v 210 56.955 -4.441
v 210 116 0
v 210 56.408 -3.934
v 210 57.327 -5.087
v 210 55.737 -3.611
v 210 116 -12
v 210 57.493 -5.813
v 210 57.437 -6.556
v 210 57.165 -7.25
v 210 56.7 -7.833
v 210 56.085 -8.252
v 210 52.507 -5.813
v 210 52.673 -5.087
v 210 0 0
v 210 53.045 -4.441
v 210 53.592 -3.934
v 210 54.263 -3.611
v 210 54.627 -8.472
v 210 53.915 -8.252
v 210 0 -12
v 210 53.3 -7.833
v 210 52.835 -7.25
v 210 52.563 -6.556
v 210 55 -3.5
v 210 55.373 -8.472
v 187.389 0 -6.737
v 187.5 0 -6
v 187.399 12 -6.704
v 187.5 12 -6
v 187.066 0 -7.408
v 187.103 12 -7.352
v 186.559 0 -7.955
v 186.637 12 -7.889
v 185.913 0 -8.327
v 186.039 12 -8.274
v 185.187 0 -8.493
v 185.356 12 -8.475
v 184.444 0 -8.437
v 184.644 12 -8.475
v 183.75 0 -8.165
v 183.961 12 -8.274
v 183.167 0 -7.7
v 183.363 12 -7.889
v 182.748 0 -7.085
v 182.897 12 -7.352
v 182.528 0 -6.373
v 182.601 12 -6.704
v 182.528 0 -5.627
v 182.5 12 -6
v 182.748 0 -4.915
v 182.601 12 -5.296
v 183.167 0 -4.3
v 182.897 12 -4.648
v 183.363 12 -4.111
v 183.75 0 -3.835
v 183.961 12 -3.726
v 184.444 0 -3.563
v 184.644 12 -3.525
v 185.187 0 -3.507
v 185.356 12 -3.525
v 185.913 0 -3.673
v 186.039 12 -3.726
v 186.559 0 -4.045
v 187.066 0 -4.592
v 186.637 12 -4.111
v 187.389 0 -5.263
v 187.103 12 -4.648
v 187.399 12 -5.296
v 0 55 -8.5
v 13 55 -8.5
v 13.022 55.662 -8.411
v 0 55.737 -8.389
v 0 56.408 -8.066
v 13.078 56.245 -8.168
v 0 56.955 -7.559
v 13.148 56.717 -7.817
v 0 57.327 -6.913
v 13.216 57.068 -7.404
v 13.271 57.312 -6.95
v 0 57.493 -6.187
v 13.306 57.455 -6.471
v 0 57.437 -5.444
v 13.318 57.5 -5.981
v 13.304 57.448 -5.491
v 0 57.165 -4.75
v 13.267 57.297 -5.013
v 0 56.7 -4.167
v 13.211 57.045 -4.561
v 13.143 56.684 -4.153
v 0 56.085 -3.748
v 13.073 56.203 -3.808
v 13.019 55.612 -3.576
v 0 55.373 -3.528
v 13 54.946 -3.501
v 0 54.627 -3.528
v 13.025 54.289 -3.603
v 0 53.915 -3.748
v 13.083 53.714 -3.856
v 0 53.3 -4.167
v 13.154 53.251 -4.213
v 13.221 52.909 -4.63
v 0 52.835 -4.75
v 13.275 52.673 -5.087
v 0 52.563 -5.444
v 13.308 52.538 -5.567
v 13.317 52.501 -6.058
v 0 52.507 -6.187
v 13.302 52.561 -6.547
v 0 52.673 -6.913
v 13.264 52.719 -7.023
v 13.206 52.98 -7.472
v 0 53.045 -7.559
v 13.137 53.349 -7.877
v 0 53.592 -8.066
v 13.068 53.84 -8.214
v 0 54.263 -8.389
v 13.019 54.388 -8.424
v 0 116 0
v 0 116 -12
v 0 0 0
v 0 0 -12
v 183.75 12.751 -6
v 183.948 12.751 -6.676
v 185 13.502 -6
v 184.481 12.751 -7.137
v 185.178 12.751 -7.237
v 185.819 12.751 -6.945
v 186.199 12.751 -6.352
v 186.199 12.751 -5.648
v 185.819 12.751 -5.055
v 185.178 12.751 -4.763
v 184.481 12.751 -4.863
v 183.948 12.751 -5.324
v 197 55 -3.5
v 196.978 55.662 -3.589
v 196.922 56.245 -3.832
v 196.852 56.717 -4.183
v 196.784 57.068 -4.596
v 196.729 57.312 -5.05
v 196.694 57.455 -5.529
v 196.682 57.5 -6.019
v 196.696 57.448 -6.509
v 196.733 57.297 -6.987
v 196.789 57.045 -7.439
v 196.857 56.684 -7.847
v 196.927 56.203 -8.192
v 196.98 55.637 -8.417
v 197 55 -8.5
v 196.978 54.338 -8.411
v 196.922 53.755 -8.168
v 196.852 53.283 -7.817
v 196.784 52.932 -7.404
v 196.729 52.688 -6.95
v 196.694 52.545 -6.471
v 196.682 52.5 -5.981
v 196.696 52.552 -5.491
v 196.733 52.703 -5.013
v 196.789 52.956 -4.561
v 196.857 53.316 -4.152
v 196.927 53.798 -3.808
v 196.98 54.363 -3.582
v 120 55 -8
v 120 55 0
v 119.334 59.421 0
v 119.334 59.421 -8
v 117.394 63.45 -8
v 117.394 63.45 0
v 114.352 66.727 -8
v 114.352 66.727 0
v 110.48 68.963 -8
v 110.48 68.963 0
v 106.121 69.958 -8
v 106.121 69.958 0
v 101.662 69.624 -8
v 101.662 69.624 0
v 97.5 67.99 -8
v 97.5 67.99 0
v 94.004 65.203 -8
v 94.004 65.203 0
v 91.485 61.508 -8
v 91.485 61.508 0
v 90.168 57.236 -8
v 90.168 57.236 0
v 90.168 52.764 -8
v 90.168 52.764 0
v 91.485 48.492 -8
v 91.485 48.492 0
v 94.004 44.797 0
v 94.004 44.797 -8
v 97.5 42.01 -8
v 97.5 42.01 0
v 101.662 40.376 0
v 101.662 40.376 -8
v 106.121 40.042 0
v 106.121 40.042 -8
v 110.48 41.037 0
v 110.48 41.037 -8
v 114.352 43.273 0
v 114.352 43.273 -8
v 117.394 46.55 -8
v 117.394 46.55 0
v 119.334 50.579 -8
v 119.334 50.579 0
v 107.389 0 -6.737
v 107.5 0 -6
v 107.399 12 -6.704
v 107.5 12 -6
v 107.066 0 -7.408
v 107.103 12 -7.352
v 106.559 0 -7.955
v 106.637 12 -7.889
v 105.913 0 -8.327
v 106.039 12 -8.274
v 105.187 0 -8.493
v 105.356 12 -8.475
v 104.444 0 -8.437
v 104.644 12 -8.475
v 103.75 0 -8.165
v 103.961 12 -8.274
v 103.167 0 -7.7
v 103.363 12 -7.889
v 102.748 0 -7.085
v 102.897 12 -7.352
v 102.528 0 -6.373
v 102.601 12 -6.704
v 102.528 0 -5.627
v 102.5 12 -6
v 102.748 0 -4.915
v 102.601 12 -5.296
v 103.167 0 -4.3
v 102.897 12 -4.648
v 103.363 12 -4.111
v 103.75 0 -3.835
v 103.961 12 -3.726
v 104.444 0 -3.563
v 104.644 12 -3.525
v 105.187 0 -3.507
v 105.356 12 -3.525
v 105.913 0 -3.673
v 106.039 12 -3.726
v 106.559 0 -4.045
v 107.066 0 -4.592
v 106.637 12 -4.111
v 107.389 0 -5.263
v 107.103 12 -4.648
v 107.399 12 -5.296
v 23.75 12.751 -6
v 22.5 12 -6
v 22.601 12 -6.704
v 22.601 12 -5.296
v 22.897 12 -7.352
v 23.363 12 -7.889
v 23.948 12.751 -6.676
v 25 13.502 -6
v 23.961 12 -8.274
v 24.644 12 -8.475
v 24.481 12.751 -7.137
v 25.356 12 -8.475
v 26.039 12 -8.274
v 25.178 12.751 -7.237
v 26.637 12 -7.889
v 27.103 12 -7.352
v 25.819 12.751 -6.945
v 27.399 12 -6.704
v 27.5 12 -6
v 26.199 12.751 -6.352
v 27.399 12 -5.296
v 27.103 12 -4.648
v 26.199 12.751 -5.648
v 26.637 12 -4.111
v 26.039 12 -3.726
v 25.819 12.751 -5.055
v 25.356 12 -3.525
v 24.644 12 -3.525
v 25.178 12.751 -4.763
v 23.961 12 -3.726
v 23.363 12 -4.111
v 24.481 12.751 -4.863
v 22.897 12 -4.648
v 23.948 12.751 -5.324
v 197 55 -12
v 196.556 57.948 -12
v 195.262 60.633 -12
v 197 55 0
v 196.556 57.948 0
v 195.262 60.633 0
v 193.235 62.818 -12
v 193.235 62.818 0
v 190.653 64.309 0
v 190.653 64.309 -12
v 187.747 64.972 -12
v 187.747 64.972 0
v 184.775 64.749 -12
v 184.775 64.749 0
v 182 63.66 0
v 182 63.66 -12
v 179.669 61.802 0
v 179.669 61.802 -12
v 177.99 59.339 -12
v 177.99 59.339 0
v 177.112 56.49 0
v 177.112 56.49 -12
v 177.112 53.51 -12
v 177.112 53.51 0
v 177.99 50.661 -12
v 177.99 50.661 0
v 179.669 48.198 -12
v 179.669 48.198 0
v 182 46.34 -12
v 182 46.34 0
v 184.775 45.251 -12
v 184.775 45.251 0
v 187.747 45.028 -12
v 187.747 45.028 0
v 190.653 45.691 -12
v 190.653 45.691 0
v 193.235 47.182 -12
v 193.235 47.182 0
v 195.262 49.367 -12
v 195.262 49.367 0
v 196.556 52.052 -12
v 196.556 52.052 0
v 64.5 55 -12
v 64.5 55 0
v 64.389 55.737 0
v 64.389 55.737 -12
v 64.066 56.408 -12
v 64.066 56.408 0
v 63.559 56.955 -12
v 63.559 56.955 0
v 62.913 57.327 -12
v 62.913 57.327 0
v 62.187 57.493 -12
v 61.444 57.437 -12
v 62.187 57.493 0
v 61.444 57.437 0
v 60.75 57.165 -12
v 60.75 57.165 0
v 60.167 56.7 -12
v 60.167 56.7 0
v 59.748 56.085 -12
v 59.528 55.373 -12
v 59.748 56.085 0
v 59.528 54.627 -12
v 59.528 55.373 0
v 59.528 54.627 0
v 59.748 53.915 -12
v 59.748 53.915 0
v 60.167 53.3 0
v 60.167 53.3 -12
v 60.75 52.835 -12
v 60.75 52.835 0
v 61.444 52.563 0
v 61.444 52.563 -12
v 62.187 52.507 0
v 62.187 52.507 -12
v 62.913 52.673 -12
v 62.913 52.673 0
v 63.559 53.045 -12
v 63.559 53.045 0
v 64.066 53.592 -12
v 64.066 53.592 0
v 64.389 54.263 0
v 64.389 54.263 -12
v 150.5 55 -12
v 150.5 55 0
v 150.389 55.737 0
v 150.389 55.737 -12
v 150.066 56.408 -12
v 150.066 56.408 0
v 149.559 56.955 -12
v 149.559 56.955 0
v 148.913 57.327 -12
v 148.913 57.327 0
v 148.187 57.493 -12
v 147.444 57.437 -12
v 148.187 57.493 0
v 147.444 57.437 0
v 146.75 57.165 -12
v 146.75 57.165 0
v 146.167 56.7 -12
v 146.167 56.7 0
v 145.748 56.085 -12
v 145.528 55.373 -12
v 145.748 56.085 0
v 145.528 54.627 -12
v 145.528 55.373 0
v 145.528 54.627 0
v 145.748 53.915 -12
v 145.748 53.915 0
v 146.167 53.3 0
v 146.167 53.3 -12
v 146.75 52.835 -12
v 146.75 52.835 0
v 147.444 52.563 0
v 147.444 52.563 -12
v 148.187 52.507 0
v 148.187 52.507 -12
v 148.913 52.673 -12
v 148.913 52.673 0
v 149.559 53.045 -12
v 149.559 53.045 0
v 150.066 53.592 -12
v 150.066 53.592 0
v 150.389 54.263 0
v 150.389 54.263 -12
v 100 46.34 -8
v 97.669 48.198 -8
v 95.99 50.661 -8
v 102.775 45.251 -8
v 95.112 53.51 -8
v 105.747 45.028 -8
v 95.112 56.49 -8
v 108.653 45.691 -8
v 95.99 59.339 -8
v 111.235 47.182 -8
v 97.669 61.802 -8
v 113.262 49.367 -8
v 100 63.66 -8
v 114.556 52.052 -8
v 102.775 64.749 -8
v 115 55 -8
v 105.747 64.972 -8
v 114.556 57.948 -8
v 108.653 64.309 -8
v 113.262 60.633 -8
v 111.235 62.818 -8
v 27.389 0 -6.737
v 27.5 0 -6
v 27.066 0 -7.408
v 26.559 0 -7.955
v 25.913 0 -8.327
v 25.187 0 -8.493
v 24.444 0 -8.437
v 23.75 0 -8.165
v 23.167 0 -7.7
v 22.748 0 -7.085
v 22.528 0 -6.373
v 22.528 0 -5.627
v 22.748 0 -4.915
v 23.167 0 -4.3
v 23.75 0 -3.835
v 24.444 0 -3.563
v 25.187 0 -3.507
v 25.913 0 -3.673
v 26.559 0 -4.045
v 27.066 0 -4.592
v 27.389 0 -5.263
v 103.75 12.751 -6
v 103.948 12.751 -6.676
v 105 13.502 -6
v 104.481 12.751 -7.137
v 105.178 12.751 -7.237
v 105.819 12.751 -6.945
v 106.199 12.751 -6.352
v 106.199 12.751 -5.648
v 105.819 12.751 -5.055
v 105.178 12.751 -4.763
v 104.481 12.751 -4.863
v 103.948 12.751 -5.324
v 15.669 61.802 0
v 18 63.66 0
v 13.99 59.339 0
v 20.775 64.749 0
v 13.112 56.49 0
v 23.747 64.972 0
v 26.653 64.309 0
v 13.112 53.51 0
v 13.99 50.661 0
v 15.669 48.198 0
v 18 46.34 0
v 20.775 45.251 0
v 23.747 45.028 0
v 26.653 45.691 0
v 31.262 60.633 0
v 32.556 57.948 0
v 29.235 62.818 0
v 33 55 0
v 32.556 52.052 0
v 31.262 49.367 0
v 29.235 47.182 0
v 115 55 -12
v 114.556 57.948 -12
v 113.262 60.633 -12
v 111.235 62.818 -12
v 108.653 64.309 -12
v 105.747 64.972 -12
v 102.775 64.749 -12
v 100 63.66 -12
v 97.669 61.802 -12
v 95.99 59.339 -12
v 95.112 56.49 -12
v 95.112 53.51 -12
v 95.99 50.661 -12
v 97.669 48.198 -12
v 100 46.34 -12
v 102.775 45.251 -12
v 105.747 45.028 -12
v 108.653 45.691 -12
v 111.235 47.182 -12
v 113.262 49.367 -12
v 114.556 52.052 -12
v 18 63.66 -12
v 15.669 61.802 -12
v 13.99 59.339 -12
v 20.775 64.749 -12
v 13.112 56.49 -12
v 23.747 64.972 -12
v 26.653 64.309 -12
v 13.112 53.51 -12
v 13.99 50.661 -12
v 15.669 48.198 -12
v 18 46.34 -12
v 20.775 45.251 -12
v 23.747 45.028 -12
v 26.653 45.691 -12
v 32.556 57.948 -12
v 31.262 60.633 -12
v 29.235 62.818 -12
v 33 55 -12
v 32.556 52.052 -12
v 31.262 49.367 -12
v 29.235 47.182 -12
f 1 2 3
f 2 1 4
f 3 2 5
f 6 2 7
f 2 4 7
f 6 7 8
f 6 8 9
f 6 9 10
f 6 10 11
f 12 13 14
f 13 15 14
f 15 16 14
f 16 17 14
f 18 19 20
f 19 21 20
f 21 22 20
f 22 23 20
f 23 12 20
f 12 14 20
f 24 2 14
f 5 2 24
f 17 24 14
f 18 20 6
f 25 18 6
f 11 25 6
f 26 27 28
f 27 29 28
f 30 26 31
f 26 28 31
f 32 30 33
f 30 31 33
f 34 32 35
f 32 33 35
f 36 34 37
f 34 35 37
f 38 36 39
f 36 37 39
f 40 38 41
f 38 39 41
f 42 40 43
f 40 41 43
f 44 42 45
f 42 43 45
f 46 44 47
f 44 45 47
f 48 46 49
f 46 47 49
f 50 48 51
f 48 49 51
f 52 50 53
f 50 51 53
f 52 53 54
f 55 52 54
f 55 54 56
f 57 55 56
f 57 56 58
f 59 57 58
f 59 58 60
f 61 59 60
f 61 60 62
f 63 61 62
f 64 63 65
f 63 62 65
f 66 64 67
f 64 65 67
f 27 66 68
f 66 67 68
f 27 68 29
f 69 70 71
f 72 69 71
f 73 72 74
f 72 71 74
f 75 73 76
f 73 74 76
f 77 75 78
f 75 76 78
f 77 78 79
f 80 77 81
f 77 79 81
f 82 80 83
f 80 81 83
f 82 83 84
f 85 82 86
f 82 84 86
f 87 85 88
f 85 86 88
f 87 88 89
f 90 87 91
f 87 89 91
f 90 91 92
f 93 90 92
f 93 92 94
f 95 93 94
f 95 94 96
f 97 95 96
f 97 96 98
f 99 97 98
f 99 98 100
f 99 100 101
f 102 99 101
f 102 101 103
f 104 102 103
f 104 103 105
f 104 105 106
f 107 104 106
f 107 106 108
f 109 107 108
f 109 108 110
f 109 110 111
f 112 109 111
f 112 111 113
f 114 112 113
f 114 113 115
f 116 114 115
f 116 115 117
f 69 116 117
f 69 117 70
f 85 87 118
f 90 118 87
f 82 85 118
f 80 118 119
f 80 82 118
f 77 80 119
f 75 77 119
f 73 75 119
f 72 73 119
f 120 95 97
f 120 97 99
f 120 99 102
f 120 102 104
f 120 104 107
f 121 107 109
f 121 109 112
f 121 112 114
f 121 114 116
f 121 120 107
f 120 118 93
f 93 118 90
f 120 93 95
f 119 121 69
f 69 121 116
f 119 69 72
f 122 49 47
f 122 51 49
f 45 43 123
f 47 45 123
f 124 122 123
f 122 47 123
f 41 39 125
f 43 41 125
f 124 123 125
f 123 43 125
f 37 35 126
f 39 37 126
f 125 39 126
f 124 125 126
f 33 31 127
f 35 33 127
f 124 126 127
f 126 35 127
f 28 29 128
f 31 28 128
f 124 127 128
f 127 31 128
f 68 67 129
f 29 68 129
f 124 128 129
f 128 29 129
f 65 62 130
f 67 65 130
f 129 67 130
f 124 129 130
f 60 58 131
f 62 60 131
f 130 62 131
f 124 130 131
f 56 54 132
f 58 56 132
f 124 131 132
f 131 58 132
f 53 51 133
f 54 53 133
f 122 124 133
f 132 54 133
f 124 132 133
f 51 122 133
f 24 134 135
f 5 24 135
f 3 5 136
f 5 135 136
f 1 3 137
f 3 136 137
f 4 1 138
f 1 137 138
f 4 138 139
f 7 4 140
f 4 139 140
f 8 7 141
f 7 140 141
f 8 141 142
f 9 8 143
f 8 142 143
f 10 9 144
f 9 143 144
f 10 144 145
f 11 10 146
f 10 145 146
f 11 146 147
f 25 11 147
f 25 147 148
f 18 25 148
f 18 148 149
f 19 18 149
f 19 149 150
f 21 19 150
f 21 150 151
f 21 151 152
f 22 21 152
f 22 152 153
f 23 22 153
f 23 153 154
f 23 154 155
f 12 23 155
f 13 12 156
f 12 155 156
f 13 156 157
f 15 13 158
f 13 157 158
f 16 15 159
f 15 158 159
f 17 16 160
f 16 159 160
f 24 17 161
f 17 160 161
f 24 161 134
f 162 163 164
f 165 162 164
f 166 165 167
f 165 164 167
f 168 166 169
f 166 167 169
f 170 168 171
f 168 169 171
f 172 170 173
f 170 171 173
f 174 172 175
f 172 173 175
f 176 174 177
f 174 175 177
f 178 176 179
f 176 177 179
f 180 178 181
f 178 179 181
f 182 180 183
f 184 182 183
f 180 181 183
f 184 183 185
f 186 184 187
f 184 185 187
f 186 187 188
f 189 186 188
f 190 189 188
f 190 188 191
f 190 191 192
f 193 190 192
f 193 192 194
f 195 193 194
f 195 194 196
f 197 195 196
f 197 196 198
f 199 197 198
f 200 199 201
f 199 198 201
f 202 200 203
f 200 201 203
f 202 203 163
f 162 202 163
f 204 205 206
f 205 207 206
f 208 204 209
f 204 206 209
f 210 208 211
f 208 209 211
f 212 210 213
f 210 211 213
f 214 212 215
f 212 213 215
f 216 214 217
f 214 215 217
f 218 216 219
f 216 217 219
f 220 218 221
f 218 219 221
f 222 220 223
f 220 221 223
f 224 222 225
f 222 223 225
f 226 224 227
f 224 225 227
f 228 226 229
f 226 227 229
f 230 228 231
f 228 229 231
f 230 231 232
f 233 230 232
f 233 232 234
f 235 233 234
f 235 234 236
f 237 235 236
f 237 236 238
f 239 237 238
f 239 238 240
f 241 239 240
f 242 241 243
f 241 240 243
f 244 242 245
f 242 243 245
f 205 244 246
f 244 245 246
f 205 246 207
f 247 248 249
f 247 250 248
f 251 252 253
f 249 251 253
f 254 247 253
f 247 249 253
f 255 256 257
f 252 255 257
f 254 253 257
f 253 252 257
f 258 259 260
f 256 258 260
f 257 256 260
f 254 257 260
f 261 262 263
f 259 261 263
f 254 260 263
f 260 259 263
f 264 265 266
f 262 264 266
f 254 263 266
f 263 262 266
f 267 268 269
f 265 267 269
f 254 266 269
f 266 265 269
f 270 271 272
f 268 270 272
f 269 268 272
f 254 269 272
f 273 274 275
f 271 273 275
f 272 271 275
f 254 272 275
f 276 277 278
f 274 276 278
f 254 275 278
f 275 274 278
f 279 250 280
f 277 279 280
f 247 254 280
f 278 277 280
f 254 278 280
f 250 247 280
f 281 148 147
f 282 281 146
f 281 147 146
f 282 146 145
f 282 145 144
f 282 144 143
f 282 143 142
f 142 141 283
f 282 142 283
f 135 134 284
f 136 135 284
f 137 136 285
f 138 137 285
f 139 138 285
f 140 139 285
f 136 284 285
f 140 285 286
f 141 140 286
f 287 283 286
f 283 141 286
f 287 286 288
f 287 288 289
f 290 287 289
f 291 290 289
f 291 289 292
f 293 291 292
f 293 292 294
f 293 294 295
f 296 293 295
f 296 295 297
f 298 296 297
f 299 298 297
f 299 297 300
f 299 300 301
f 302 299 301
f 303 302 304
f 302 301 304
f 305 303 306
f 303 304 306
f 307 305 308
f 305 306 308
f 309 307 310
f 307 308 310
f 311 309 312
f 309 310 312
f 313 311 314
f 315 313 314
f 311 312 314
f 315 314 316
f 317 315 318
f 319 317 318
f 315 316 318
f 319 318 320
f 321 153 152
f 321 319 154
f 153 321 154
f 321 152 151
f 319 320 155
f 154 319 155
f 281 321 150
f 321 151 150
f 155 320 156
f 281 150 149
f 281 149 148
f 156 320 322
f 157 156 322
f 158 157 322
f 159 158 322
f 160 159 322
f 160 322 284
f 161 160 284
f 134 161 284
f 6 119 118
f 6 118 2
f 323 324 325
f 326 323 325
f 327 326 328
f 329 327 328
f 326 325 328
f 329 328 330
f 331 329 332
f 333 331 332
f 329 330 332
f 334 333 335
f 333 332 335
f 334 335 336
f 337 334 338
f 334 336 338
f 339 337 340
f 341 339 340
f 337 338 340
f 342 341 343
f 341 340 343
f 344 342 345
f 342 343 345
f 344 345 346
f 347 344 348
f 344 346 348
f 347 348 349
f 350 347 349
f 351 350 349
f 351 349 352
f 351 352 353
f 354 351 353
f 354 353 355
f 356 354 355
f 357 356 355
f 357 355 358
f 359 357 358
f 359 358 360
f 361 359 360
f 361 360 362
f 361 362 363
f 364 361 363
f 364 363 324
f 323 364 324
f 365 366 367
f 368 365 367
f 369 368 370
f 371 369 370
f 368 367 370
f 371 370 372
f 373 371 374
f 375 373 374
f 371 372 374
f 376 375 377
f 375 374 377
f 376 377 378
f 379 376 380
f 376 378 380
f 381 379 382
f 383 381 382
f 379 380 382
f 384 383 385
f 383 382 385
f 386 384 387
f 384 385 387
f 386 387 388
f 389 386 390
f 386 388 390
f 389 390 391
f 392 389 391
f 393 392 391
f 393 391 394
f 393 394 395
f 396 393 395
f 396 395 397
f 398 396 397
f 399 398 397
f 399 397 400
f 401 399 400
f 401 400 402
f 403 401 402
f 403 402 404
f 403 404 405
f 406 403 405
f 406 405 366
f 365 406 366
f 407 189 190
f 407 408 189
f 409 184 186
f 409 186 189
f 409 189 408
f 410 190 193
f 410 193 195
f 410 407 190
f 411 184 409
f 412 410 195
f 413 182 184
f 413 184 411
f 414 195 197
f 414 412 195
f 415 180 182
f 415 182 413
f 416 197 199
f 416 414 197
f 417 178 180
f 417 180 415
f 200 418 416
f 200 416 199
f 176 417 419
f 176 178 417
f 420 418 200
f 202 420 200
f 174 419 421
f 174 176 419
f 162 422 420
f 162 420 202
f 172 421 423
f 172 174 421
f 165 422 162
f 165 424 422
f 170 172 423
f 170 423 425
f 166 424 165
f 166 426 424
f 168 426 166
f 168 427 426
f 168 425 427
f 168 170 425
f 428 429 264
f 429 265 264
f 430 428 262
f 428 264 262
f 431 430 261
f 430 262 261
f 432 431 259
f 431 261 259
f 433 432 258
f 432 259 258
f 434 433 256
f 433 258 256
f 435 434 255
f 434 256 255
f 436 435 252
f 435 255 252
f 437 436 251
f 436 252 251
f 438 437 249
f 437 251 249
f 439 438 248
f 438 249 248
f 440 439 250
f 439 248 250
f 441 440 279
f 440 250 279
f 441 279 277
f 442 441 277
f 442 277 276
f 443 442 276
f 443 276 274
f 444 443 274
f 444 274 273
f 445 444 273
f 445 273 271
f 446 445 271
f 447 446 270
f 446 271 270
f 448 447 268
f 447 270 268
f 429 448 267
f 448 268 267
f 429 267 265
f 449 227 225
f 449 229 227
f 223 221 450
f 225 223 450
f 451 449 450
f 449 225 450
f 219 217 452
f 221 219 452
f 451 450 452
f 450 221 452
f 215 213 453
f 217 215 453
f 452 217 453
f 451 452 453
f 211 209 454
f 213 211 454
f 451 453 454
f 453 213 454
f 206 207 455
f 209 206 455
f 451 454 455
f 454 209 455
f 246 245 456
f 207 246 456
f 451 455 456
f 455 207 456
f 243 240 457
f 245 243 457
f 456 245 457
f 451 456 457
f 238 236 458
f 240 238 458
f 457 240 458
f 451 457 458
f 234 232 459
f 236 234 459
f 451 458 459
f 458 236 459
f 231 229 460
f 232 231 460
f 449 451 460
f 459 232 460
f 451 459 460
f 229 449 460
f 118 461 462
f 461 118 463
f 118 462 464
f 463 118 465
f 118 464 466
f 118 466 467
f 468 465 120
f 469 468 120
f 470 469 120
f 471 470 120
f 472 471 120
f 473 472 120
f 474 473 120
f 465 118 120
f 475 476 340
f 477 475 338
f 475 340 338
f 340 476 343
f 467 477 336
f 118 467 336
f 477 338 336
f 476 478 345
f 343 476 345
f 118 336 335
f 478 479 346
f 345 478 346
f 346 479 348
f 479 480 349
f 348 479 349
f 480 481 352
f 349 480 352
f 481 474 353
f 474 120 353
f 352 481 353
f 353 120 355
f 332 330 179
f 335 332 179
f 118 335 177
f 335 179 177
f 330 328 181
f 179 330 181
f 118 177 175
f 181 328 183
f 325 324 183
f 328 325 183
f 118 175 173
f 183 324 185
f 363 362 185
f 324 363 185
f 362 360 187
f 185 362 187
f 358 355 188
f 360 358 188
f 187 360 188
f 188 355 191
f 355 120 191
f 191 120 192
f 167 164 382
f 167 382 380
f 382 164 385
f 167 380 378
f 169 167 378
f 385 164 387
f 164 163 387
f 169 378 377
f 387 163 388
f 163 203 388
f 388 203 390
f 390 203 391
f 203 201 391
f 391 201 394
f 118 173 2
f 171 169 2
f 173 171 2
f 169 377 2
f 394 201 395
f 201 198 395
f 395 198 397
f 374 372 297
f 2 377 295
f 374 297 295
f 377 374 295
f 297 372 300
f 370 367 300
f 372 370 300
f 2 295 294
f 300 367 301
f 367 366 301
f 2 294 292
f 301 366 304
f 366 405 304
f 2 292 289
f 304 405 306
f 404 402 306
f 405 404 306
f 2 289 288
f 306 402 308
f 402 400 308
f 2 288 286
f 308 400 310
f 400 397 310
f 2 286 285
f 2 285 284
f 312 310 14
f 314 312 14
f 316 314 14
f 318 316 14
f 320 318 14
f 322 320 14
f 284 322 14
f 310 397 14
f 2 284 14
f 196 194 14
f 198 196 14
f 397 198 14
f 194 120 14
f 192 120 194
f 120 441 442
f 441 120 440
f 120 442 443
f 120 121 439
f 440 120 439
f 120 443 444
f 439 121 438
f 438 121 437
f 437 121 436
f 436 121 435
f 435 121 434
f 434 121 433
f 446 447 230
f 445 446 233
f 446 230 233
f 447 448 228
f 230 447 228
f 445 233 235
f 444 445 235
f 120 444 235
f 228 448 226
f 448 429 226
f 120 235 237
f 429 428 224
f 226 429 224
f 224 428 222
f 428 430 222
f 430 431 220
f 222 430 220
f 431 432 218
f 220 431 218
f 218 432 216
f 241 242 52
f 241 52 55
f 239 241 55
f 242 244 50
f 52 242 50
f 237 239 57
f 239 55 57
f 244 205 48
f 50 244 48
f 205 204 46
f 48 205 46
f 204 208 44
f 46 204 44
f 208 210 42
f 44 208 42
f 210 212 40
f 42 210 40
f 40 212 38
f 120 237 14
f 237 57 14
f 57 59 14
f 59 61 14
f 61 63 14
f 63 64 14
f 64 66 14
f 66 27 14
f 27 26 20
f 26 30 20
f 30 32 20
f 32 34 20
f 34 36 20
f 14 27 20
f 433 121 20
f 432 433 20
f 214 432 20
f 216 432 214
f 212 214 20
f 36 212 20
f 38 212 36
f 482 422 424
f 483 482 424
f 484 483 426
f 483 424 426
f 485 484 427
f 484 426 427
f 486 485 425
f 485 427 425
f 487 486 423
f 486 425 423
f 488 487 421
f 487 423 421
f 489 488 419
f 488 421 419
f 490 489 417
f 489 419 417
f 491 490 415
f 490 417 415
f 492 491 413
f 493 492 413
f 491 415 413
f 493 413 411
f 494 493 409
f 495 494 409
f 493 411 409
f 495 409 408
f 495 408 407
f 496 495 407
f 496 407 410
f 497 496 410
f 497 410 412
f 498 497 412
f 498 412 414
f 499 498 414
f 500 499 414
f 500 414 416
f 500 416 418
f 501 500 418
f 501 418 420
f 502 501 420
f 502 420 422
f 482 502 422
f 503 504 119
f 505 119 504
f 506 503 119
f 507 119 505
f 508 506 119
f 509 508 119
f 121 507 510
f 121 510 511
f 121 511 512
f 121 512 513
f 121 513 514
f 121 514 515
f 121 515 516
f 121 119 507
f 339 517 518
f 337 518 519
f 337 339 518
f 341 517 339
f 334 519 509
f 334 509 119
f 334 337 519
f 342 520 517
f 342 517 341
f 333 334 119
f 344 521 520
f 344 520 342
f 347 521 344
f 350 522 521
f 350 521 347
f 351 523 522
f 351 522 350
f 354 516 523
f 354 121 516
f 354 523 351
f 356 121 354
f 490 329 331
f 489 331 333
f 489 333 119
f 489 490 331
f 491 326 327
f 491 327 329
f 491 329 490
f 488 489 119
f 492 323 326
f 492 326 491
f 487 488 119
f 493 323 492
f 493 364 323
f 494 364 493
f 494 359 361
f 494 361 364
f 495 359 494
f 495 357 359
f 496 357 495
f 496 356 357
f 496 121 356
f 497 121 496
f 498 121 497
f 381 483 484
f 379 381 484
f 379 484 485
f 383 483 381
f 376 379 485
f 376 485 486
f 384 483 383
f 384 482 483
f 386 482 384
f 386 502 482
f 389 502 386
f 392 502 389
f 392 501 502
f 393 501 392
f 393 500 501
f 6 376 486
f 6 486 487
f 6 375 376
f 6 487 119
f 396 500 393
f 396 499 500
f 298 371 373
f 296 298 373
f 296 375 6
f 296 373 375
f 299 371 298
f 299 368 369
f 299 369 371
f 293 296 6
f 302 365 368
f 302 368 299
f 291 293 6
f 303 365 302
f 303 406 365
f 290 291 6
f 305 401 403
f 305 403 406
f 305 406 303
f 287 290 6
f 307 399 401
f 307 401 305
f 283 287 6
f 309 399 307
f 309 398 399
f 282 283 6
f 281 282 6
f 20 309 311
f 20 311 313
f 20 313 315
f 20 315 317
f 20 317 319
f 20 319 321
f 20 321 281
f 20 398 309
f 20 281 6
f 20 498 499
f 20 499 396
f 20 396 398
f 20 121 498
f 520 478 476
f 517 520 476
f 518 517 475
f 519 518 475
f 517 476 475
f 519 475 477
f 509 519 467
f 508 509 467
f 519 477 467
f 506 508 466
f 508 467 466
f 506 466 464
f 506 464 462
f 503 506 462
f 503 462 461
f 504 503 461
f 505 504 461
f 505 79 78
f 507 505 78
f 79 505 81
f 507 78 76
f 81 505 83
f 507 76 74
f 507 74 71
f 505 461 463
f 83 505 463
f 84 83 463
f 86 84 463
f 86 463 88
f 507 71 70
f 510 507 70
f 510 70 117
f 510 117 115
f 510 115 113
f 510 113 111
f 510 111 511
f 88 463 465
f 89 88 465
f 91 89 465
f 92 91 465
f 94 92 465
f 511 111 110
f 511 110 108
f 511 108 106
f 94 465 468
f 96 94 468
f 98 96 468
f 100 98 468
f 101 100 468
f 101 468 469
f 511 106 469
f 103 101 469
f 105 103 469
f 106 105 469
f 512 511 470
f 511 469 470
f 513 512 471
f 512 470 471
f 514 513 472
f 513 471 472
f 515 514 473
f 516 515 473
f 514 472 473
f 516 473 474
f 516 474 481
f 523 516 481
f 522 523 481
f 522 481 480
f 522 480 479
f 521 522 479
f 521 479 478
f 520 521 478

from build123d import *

# Parameters (mm, degrees)
SKETCH1_W                 = 210
SKETCH1_H                 = 12
BOSS_EXTRUDE1_DEPTH       = 116
SKETCH2_R                 = 10
CUT_EXTRUDE1_DEPTH        = 13
F_5_0MM_DOWEL_HOLE1_D     = 5
F_5_0MM_DOWEL_HOLE1_DEPTH = 25
F_5_0MM_DOWEL_HOLE1_TIP   = 1.502151548
F_5_0MM_DOWEL_HOLE2_D     = 5
F_5_0MM_DOWEL_HOLE2_DEPTH = 25
F_5_0MM_DOWEL_HOLE2_TIP   = 1.502151548
SKETCH7_R                 = 10
CUT_EXTRUDE2_DEPTH        = 13.0000001
SKETCH8_R                 = 15
CUT_EXTRUDE3_DEPTH        = 8
F_5_0MM_DOWEL_HOLE3_D     = 5
F_5_0MM_DOWEL_HOLE3_DEPTH = 12
F_5_0MM_DOWEL_HOLE3_TIP   = 1.502151548
F_5_0MM_DOWEL_HOLE4_D     = 5
F_5_0MM_DOWEL_HOLE4_DEPTH = 25
F_5_0MM_DOWEL_HOLE4_TIP   = 1.502151548


with BuildPart() as part:
    # Sketch1 → Boss-Extrude1 (new body)
    with BuildSketch(Plane(origin=(0, 0, 0), x_dir=(1, 0, 0), z_dir=(0, 1, 0))):
        with Locations((105, 6)):
            Rectangle(SKETCH1_W, SKETCH1_H)
    extrude(amount=BOSS_EXTRUDE1_DEPTH)

    # Sketch2 → Cut-Extrude1 (cut, through all)
    with BuildSketch(Plane.XY):
        with Locations((23, 55)):
            Circle(SKETCH2_R)
        with Locations((187, 55)):
            Circle(SKETCH2_R)
    extrude(amount=-CUT_EXTRUDE1_DEPTH, mode=Mode.SUBTRACT)

    # Ø5.0mm Dowel Hole1
    with Locations(Plane.ZY):
        with Locations((-6, 55)):
            Hole(F_5_0MM_DOWEL_HOLE1_D / 2, depth=F_5_0MM_DOWEL_HOLE1_DEPTH)
            with Locations((0, 0, -(F_5_0MM_DOWEL_HOLE1_DEPTH + F_5_0MM_DOWEL_HOLE1_TIP / 2))):  # 118° drill point
                Cone(0, F_5_0MM_DOWEL_HOLE1_D / 2, F_5_0MM_DOWEL_HOLE1_TIP, mode=Mode.SUBTRACT)

    # Ø5.0mm Dowel Hole2
    with Locations(Plane(origin=(210, 0, 0), x_dir=(0, 0, -1), z_dir=(1, 0, 0))):
        with Locations((6, 55)):
            Hole(F_5_0MM_DOWEL_HOLE2_D / 2, depth=F_5_0MM_DOWEL_HOLE2_DEPTH)
            with Locations((0, 0, -(F_5_0MM_DOWEL_HOLE2_DEPTH + F_5_0MM_DOWEL_HOLE2_TIP / 2))):  # 118° drill point
                Cone(0, F_5_0MM_DOWEL_HOLE2_D / 2, F_5_0MM_DOWEL_HOLE2_TIP, mode=Mode.SUBTRACT)

    # Sketch7 → Cut-Extrude2 (cut, through all)
    with BuildSketch(Plane.XY):
        with Locations((105, 55)):
            Circle(SKETCH7_R)
    extrude(amount=-CUT_EXTRUDE2_DEPTH, mode=Mode.SUBTRACT)

    # Sketch8 → Cut-Extrude3 (cut)
    with BuildSketch(Plane.XY):
        with Locations((105, 55)):
            Circle(SKETCH8_R)
    extrude(amount=-CUT_EXTRUDE3_DEPTH, mode=Mode.SUBTRACT)

    # Ø5.0mm Dowel Hole3
    with Locations(Plane(origin=(0, 0, 0), x_dir=(-1, 0, 0), z_dir=(0, -1, 0))):
        with Locations((-25, 6), (-105, 6), (-185, 6)):
            Hole(F_5_0MM_DOWEL_HOLE3_D / 2, depth=F_5_0MM_DOWEL_HOLE3_DEPTH)
            with Locations((0, 0, -(F_5_0MM_DOWEL_HOLE3_DEPTH + F_5_0MM_DOWEL_HOLE3_TIP / 2))):  # 118° drill point
                Cone(0, F_5_0MM_DOWEL_HOLE3_D / 2, F_5_0MM_DOWEL_HOLE3_TIP, mode=Mode.SUBTRACT)

    # Ø5.0mm Dowel Hole4
    with Locations(Plane(origin=(0, 0, -12), x_dir=(-1, 0, 0), z_dir=(0, 0, -1))):
        with Locations((-148, 55), (-62, 55)):
            Hole(F_5_0MM_DOWEL_HOLE4_D / 2, depth=F_5_0MM_DOWEL_HOLE4_DEPTH)
            with Locations((0, 0, -(F_5_0MM_DOWEL_HOLE4_DEPTH + F_5_0MM_DOWEL_HOLE4_TIP / 2))):  # 118° drill point
                Cone(0, F_5_0MM_DOWEL_HOLE4_D / 2, F_5_0MM_DOWEL_HOLE4_TIP, mode=Mode.SUBTRACT)


solid = part.part
